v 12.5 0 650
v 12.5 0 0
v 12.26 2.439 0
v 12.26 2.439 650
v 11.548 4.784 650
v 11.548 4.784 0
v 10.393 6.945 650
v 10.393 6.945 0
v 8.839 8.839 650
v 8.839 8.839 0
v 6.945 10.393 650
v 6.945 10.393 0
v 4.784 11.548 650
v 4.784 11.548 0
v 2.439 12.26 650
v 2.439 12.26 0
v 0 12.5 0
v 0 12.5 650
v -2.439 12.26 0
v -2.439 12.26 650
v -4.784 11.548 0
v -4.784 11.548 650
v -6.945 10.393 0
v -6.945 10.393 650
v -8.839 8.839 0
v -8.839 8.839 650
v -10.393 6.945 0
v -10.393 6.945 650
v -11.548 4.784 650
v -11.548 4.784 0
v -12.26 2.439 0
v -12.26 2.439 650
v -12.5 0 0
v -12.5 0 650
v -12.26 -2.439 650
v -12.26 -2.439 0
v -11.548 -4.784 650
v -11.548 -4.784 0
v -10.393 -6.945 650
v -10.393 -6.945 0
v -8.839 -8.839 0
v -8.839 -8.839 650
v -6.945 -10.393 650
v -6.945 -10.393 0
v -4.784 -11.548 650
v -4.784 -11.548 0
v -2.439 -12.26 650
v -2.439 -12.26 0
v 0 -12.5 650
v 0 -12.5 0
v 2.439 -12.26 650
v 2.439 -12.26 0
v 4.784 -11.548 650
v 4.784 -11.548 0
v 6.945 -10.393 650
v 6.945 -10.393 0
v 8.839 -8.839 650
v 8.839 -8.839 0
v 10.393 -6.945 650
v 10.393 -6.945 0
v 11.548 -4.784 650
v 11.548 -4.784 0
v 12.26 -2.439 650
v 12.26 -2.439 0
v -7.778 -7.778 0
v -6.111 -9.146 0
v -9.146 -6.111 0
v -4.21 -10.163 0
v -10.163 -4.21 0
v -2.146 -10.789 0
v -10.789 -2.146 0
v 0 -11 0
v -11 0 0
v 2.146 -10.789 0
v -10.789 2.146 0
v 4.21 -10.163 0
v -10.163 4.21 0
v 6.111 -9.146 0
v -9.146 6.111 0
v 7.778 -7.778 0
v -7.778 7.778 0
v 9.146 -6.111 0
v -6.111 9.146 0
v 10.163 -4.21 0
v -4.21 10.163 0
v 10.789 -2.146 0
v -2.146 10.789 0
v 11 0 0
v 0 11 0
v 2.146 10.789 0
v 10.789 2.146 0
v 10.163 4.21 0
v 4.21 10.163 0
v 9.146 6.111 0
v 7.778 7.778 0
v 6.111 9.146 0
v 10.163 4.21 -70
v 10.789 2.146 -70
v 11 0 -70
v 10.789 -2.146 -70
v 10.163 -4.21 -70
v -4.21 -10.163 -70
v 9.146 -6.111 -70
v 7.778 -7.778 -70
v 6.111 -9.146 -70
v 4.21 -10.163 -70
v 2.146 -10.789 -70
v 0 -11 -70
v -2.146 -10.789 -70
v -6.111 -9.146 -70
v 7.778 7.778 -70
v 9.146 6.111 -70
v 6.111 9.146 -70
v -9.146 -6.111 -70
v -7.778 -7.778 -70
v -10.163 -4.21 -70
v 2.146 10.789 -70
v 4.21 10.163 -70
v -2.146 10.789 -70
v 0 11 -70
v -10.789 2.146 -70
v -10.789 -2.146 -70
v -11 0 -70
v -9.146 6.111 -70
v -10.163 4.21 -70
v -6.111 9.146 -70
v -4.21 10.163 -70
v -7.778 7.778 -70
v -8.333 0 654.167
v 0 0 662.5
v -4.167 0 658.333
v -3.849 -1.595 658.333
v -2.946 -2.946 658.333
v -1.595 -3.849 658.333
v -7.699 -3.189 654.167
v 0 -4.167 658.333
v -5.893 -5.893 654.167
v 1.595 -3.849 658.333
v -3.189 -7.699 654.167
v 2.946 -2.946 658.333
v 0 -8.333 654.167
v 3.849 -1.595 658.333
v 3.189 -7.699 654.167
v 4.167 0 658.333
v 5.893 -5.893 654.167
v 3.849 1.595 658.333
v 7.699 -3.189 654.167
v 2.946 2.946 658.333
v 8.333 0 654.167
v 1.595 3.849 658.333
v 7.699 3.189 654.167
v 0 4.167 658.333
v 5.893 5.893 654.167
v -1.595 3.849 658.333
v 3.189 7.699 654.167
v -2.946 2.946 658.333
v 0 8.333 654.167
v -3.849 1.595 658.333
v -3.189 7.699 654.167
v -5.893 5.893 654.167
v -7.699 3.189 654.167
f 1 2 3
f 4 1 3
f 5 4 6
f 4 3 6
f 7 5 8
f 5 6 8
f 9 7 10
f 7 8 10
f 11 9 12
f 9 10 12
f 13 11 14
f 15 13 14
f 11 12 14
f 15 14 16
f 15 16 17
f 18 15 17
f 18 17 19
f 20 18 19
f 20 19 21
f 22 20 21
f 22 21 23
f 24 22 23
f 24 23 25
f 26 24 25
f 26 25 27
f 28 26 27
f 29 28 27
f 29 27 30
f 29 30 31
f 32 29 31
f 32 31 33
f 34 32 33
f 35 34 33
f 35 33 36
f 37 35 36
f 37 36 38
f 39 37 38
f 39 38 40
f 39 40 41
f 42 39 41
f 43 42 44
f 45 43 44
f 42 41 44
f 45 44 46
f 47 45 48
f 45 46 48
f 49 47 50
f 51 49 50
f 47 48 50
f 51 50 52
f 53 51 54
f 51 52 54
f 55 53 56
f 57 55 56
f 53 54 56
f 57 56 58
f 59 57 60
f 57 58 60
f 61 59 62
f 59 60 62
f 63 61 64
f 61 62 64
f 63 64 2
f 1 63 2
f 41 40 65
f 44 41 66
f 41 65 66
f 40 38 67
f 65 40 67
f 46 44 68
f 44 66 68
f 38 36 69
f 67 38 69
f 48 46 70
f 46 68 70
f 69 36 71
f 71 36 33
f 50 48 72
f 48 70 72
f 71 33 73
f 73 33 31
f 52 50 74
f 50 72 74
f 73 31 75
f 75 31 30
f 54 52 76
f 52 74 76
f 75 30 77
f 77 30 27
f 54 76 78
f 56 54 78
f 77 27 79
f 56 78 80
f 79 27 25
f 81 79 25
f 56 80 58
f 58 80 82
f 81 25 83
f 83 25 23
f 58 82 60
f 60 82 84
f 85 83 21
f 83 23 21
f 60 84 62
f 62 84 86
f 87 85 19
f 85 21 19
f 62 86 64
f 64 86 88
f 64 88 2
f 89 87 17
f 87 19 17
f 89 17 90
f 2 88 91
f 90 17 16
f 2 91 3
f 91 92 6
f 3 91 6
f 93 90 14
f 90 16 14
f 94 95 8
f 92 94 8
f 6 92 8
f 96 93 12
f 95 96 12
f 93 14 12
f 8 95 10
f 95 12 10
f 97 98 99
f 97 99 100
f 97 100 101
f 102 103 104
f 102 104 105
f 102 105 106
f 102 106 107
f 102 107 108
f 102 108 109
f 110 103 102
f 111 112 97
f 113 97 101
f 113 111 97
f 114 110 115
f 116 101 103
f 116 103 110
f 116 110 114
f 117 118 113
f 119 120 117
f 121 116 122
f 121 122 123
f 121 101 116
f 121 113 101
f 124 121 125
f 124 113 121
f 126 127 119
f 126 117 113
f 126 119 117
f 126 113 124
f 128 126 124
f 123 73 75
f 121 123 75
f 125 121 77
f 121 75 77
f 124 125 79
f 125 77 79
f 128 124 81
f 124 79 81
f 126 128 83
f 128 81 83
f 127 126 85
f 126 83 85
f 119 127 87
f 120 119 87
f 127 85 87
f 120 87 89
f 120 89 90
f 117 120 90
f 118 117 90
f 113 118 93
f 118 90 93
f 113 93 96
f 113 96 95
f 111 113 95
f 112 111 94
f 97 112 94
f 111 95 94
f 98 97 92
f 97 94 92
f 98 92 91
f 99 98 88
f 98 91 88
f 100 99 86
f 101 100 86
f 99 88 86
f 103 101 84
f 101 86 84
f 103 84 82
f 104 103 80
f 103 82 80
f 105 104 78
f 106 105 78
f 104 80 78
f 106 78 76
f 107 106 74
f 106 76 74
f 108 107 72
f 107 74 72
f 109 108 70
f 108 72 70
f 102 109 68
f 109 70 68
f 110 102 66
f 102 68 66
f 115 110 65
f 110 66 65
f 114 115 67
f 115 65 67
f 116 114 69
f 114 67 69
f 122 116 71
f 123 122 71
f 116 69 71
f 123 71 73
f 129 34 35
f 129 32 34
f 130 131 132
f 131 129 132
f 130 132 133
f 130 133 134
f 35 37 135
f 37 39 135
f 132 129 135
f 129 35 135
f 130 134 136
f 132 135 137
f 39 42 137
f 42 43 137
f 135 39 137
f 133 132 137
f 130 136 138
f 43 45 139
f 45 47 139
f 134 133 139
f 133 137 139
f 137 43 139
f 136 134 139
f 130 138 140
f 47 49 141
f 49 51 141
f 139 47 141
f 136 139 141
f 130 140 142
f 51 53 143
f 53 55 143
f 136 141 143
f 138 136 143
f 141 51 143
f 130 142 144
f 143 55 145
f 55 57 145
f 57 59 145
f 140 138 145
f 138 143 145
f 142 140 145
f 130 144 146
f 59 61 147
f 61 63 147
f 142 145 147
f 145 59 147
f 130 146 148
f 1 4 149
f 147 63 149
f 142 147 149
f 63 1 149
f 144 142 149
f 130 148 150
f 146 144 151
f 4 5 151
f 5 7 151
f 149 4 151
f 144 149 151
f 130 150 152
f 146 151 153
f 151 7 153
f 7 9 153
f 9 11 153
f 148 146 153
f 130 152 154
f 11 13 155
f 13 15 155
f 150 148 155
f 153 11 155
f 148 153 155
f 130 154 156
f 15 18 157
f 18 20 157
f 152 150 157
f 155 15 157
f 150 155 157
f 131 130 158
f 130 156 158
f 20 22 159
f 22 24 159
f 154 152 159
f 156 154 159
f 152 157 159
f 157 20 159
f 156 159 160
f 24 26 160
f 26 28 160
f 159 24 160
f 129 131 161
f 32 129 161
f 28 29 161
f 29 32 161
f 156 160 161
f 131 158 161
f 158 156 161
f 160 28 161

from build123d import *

# Parameters (mm, degrees)
SKETCH1_R           = 12.5
BOSS_EXTRUDE1_DEPTH = 650
SKETCH3_R           = 11
BOSS_EXTRUDE2_DEPTH = 70


with BuildPart() as part:
    # Sketch1 → Boss-Extrude1 (new body)
    with BuildSketch(Plane.XY):
        Circle(SKETCH1_R)
    extrude(amount=BOSS_EXTRUDE1_DEPTH)

    # Sketch2 → Revolve1 (revolve)
    with BuildSketch(Plane(origin=(0, 0, 0), x_dir=(1, 0, 0), z_dir=(0, 1, 0)), mode=Mode.PRIVATE) as revolve1_sk:
        Polygon((0, -650), (0, -662.5), (12.5, -650), align=None)
    revolve(revolve1_sk.sketch.rotate(Axis((0, 0, 650), (0, 0, 1)), 180), axis=Axis((0, 0, 650), (0, 0, 1)))

    # Sketch3 → Boss-Extrude2 (add)
    with BuildSketch(Plane(origin=(0, 0, 0), x_dir=(-1, 0, 0), z_dir=(0, 0, -1))):
        Circle(SKETCH3_R)
    extrude(amount=BOSS_EXTRUDE2_DEPTH)


solid = part.part
